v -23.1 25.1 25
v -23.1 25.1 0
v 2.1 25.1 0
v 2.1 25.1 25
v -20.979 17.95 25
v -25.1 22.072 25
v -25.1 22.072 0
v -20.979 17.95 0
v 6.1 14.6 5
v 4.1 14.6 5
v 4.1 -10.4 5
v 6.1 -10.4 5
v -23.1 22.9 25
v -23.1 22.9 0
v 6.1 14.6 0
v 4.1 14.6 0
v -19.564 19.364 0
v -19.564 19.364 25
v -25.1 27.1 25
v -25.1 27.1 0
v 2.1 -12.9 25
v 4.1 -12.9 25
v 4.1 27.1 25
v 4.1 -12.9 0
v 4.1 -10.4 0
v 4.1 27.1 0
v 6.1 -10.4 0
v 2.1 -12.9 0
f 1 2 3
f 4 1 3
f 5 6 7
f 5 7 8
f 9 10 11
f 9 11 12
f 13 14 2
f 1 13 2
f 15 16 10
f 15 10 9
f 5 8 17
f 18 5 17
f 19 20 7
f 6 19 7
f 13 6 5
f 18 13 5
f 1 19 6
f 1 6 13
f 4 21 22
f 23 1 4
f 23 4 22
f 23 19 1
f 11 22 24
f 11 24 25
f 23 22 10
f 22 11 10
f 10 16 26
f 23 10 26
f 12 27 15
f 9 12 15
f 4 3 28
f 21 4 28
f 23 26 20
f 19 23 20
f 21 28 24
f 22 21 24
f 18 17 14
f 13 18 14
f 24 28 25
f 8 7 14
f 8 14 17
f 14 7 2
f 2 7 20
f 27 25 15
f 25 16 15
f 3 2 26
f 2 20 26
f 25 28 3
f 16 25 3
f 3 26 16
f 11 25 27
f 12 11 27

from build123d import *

# Parameters (mm, degrees)
F1_DEPTH = 25
F0_W     = 2
F0_H     = 25
F2_DEPTH = 5


with BuildPart() as f1:
    # F0 (on Top) → F1 (new body)
    with BuildSketch(Plane.XY):
        Polygon((-19.564466, 19.364466), (-23.1, 22.9), (-23.1, 25.1), (2.1, 25.1), (2.1, -12.9), (4.1, -12.9), (4.1, -10.4), (4.1, 14.6), (4.1, 27.1), (-25.1, 27.1), (-25.1, 22.071573), (-20.97868, 17.950253), align=None)
    extrude(amount=F1_DEPTH)

    # F0 (on Top) → F2 (join)
    with BuildSketch(Plane.XY):
        with Locations((5.1, 2.1)):
            Rectangle(F0_W, F0_H)
    extrude(amount=F2_DEPTH)


solid = f1.part
